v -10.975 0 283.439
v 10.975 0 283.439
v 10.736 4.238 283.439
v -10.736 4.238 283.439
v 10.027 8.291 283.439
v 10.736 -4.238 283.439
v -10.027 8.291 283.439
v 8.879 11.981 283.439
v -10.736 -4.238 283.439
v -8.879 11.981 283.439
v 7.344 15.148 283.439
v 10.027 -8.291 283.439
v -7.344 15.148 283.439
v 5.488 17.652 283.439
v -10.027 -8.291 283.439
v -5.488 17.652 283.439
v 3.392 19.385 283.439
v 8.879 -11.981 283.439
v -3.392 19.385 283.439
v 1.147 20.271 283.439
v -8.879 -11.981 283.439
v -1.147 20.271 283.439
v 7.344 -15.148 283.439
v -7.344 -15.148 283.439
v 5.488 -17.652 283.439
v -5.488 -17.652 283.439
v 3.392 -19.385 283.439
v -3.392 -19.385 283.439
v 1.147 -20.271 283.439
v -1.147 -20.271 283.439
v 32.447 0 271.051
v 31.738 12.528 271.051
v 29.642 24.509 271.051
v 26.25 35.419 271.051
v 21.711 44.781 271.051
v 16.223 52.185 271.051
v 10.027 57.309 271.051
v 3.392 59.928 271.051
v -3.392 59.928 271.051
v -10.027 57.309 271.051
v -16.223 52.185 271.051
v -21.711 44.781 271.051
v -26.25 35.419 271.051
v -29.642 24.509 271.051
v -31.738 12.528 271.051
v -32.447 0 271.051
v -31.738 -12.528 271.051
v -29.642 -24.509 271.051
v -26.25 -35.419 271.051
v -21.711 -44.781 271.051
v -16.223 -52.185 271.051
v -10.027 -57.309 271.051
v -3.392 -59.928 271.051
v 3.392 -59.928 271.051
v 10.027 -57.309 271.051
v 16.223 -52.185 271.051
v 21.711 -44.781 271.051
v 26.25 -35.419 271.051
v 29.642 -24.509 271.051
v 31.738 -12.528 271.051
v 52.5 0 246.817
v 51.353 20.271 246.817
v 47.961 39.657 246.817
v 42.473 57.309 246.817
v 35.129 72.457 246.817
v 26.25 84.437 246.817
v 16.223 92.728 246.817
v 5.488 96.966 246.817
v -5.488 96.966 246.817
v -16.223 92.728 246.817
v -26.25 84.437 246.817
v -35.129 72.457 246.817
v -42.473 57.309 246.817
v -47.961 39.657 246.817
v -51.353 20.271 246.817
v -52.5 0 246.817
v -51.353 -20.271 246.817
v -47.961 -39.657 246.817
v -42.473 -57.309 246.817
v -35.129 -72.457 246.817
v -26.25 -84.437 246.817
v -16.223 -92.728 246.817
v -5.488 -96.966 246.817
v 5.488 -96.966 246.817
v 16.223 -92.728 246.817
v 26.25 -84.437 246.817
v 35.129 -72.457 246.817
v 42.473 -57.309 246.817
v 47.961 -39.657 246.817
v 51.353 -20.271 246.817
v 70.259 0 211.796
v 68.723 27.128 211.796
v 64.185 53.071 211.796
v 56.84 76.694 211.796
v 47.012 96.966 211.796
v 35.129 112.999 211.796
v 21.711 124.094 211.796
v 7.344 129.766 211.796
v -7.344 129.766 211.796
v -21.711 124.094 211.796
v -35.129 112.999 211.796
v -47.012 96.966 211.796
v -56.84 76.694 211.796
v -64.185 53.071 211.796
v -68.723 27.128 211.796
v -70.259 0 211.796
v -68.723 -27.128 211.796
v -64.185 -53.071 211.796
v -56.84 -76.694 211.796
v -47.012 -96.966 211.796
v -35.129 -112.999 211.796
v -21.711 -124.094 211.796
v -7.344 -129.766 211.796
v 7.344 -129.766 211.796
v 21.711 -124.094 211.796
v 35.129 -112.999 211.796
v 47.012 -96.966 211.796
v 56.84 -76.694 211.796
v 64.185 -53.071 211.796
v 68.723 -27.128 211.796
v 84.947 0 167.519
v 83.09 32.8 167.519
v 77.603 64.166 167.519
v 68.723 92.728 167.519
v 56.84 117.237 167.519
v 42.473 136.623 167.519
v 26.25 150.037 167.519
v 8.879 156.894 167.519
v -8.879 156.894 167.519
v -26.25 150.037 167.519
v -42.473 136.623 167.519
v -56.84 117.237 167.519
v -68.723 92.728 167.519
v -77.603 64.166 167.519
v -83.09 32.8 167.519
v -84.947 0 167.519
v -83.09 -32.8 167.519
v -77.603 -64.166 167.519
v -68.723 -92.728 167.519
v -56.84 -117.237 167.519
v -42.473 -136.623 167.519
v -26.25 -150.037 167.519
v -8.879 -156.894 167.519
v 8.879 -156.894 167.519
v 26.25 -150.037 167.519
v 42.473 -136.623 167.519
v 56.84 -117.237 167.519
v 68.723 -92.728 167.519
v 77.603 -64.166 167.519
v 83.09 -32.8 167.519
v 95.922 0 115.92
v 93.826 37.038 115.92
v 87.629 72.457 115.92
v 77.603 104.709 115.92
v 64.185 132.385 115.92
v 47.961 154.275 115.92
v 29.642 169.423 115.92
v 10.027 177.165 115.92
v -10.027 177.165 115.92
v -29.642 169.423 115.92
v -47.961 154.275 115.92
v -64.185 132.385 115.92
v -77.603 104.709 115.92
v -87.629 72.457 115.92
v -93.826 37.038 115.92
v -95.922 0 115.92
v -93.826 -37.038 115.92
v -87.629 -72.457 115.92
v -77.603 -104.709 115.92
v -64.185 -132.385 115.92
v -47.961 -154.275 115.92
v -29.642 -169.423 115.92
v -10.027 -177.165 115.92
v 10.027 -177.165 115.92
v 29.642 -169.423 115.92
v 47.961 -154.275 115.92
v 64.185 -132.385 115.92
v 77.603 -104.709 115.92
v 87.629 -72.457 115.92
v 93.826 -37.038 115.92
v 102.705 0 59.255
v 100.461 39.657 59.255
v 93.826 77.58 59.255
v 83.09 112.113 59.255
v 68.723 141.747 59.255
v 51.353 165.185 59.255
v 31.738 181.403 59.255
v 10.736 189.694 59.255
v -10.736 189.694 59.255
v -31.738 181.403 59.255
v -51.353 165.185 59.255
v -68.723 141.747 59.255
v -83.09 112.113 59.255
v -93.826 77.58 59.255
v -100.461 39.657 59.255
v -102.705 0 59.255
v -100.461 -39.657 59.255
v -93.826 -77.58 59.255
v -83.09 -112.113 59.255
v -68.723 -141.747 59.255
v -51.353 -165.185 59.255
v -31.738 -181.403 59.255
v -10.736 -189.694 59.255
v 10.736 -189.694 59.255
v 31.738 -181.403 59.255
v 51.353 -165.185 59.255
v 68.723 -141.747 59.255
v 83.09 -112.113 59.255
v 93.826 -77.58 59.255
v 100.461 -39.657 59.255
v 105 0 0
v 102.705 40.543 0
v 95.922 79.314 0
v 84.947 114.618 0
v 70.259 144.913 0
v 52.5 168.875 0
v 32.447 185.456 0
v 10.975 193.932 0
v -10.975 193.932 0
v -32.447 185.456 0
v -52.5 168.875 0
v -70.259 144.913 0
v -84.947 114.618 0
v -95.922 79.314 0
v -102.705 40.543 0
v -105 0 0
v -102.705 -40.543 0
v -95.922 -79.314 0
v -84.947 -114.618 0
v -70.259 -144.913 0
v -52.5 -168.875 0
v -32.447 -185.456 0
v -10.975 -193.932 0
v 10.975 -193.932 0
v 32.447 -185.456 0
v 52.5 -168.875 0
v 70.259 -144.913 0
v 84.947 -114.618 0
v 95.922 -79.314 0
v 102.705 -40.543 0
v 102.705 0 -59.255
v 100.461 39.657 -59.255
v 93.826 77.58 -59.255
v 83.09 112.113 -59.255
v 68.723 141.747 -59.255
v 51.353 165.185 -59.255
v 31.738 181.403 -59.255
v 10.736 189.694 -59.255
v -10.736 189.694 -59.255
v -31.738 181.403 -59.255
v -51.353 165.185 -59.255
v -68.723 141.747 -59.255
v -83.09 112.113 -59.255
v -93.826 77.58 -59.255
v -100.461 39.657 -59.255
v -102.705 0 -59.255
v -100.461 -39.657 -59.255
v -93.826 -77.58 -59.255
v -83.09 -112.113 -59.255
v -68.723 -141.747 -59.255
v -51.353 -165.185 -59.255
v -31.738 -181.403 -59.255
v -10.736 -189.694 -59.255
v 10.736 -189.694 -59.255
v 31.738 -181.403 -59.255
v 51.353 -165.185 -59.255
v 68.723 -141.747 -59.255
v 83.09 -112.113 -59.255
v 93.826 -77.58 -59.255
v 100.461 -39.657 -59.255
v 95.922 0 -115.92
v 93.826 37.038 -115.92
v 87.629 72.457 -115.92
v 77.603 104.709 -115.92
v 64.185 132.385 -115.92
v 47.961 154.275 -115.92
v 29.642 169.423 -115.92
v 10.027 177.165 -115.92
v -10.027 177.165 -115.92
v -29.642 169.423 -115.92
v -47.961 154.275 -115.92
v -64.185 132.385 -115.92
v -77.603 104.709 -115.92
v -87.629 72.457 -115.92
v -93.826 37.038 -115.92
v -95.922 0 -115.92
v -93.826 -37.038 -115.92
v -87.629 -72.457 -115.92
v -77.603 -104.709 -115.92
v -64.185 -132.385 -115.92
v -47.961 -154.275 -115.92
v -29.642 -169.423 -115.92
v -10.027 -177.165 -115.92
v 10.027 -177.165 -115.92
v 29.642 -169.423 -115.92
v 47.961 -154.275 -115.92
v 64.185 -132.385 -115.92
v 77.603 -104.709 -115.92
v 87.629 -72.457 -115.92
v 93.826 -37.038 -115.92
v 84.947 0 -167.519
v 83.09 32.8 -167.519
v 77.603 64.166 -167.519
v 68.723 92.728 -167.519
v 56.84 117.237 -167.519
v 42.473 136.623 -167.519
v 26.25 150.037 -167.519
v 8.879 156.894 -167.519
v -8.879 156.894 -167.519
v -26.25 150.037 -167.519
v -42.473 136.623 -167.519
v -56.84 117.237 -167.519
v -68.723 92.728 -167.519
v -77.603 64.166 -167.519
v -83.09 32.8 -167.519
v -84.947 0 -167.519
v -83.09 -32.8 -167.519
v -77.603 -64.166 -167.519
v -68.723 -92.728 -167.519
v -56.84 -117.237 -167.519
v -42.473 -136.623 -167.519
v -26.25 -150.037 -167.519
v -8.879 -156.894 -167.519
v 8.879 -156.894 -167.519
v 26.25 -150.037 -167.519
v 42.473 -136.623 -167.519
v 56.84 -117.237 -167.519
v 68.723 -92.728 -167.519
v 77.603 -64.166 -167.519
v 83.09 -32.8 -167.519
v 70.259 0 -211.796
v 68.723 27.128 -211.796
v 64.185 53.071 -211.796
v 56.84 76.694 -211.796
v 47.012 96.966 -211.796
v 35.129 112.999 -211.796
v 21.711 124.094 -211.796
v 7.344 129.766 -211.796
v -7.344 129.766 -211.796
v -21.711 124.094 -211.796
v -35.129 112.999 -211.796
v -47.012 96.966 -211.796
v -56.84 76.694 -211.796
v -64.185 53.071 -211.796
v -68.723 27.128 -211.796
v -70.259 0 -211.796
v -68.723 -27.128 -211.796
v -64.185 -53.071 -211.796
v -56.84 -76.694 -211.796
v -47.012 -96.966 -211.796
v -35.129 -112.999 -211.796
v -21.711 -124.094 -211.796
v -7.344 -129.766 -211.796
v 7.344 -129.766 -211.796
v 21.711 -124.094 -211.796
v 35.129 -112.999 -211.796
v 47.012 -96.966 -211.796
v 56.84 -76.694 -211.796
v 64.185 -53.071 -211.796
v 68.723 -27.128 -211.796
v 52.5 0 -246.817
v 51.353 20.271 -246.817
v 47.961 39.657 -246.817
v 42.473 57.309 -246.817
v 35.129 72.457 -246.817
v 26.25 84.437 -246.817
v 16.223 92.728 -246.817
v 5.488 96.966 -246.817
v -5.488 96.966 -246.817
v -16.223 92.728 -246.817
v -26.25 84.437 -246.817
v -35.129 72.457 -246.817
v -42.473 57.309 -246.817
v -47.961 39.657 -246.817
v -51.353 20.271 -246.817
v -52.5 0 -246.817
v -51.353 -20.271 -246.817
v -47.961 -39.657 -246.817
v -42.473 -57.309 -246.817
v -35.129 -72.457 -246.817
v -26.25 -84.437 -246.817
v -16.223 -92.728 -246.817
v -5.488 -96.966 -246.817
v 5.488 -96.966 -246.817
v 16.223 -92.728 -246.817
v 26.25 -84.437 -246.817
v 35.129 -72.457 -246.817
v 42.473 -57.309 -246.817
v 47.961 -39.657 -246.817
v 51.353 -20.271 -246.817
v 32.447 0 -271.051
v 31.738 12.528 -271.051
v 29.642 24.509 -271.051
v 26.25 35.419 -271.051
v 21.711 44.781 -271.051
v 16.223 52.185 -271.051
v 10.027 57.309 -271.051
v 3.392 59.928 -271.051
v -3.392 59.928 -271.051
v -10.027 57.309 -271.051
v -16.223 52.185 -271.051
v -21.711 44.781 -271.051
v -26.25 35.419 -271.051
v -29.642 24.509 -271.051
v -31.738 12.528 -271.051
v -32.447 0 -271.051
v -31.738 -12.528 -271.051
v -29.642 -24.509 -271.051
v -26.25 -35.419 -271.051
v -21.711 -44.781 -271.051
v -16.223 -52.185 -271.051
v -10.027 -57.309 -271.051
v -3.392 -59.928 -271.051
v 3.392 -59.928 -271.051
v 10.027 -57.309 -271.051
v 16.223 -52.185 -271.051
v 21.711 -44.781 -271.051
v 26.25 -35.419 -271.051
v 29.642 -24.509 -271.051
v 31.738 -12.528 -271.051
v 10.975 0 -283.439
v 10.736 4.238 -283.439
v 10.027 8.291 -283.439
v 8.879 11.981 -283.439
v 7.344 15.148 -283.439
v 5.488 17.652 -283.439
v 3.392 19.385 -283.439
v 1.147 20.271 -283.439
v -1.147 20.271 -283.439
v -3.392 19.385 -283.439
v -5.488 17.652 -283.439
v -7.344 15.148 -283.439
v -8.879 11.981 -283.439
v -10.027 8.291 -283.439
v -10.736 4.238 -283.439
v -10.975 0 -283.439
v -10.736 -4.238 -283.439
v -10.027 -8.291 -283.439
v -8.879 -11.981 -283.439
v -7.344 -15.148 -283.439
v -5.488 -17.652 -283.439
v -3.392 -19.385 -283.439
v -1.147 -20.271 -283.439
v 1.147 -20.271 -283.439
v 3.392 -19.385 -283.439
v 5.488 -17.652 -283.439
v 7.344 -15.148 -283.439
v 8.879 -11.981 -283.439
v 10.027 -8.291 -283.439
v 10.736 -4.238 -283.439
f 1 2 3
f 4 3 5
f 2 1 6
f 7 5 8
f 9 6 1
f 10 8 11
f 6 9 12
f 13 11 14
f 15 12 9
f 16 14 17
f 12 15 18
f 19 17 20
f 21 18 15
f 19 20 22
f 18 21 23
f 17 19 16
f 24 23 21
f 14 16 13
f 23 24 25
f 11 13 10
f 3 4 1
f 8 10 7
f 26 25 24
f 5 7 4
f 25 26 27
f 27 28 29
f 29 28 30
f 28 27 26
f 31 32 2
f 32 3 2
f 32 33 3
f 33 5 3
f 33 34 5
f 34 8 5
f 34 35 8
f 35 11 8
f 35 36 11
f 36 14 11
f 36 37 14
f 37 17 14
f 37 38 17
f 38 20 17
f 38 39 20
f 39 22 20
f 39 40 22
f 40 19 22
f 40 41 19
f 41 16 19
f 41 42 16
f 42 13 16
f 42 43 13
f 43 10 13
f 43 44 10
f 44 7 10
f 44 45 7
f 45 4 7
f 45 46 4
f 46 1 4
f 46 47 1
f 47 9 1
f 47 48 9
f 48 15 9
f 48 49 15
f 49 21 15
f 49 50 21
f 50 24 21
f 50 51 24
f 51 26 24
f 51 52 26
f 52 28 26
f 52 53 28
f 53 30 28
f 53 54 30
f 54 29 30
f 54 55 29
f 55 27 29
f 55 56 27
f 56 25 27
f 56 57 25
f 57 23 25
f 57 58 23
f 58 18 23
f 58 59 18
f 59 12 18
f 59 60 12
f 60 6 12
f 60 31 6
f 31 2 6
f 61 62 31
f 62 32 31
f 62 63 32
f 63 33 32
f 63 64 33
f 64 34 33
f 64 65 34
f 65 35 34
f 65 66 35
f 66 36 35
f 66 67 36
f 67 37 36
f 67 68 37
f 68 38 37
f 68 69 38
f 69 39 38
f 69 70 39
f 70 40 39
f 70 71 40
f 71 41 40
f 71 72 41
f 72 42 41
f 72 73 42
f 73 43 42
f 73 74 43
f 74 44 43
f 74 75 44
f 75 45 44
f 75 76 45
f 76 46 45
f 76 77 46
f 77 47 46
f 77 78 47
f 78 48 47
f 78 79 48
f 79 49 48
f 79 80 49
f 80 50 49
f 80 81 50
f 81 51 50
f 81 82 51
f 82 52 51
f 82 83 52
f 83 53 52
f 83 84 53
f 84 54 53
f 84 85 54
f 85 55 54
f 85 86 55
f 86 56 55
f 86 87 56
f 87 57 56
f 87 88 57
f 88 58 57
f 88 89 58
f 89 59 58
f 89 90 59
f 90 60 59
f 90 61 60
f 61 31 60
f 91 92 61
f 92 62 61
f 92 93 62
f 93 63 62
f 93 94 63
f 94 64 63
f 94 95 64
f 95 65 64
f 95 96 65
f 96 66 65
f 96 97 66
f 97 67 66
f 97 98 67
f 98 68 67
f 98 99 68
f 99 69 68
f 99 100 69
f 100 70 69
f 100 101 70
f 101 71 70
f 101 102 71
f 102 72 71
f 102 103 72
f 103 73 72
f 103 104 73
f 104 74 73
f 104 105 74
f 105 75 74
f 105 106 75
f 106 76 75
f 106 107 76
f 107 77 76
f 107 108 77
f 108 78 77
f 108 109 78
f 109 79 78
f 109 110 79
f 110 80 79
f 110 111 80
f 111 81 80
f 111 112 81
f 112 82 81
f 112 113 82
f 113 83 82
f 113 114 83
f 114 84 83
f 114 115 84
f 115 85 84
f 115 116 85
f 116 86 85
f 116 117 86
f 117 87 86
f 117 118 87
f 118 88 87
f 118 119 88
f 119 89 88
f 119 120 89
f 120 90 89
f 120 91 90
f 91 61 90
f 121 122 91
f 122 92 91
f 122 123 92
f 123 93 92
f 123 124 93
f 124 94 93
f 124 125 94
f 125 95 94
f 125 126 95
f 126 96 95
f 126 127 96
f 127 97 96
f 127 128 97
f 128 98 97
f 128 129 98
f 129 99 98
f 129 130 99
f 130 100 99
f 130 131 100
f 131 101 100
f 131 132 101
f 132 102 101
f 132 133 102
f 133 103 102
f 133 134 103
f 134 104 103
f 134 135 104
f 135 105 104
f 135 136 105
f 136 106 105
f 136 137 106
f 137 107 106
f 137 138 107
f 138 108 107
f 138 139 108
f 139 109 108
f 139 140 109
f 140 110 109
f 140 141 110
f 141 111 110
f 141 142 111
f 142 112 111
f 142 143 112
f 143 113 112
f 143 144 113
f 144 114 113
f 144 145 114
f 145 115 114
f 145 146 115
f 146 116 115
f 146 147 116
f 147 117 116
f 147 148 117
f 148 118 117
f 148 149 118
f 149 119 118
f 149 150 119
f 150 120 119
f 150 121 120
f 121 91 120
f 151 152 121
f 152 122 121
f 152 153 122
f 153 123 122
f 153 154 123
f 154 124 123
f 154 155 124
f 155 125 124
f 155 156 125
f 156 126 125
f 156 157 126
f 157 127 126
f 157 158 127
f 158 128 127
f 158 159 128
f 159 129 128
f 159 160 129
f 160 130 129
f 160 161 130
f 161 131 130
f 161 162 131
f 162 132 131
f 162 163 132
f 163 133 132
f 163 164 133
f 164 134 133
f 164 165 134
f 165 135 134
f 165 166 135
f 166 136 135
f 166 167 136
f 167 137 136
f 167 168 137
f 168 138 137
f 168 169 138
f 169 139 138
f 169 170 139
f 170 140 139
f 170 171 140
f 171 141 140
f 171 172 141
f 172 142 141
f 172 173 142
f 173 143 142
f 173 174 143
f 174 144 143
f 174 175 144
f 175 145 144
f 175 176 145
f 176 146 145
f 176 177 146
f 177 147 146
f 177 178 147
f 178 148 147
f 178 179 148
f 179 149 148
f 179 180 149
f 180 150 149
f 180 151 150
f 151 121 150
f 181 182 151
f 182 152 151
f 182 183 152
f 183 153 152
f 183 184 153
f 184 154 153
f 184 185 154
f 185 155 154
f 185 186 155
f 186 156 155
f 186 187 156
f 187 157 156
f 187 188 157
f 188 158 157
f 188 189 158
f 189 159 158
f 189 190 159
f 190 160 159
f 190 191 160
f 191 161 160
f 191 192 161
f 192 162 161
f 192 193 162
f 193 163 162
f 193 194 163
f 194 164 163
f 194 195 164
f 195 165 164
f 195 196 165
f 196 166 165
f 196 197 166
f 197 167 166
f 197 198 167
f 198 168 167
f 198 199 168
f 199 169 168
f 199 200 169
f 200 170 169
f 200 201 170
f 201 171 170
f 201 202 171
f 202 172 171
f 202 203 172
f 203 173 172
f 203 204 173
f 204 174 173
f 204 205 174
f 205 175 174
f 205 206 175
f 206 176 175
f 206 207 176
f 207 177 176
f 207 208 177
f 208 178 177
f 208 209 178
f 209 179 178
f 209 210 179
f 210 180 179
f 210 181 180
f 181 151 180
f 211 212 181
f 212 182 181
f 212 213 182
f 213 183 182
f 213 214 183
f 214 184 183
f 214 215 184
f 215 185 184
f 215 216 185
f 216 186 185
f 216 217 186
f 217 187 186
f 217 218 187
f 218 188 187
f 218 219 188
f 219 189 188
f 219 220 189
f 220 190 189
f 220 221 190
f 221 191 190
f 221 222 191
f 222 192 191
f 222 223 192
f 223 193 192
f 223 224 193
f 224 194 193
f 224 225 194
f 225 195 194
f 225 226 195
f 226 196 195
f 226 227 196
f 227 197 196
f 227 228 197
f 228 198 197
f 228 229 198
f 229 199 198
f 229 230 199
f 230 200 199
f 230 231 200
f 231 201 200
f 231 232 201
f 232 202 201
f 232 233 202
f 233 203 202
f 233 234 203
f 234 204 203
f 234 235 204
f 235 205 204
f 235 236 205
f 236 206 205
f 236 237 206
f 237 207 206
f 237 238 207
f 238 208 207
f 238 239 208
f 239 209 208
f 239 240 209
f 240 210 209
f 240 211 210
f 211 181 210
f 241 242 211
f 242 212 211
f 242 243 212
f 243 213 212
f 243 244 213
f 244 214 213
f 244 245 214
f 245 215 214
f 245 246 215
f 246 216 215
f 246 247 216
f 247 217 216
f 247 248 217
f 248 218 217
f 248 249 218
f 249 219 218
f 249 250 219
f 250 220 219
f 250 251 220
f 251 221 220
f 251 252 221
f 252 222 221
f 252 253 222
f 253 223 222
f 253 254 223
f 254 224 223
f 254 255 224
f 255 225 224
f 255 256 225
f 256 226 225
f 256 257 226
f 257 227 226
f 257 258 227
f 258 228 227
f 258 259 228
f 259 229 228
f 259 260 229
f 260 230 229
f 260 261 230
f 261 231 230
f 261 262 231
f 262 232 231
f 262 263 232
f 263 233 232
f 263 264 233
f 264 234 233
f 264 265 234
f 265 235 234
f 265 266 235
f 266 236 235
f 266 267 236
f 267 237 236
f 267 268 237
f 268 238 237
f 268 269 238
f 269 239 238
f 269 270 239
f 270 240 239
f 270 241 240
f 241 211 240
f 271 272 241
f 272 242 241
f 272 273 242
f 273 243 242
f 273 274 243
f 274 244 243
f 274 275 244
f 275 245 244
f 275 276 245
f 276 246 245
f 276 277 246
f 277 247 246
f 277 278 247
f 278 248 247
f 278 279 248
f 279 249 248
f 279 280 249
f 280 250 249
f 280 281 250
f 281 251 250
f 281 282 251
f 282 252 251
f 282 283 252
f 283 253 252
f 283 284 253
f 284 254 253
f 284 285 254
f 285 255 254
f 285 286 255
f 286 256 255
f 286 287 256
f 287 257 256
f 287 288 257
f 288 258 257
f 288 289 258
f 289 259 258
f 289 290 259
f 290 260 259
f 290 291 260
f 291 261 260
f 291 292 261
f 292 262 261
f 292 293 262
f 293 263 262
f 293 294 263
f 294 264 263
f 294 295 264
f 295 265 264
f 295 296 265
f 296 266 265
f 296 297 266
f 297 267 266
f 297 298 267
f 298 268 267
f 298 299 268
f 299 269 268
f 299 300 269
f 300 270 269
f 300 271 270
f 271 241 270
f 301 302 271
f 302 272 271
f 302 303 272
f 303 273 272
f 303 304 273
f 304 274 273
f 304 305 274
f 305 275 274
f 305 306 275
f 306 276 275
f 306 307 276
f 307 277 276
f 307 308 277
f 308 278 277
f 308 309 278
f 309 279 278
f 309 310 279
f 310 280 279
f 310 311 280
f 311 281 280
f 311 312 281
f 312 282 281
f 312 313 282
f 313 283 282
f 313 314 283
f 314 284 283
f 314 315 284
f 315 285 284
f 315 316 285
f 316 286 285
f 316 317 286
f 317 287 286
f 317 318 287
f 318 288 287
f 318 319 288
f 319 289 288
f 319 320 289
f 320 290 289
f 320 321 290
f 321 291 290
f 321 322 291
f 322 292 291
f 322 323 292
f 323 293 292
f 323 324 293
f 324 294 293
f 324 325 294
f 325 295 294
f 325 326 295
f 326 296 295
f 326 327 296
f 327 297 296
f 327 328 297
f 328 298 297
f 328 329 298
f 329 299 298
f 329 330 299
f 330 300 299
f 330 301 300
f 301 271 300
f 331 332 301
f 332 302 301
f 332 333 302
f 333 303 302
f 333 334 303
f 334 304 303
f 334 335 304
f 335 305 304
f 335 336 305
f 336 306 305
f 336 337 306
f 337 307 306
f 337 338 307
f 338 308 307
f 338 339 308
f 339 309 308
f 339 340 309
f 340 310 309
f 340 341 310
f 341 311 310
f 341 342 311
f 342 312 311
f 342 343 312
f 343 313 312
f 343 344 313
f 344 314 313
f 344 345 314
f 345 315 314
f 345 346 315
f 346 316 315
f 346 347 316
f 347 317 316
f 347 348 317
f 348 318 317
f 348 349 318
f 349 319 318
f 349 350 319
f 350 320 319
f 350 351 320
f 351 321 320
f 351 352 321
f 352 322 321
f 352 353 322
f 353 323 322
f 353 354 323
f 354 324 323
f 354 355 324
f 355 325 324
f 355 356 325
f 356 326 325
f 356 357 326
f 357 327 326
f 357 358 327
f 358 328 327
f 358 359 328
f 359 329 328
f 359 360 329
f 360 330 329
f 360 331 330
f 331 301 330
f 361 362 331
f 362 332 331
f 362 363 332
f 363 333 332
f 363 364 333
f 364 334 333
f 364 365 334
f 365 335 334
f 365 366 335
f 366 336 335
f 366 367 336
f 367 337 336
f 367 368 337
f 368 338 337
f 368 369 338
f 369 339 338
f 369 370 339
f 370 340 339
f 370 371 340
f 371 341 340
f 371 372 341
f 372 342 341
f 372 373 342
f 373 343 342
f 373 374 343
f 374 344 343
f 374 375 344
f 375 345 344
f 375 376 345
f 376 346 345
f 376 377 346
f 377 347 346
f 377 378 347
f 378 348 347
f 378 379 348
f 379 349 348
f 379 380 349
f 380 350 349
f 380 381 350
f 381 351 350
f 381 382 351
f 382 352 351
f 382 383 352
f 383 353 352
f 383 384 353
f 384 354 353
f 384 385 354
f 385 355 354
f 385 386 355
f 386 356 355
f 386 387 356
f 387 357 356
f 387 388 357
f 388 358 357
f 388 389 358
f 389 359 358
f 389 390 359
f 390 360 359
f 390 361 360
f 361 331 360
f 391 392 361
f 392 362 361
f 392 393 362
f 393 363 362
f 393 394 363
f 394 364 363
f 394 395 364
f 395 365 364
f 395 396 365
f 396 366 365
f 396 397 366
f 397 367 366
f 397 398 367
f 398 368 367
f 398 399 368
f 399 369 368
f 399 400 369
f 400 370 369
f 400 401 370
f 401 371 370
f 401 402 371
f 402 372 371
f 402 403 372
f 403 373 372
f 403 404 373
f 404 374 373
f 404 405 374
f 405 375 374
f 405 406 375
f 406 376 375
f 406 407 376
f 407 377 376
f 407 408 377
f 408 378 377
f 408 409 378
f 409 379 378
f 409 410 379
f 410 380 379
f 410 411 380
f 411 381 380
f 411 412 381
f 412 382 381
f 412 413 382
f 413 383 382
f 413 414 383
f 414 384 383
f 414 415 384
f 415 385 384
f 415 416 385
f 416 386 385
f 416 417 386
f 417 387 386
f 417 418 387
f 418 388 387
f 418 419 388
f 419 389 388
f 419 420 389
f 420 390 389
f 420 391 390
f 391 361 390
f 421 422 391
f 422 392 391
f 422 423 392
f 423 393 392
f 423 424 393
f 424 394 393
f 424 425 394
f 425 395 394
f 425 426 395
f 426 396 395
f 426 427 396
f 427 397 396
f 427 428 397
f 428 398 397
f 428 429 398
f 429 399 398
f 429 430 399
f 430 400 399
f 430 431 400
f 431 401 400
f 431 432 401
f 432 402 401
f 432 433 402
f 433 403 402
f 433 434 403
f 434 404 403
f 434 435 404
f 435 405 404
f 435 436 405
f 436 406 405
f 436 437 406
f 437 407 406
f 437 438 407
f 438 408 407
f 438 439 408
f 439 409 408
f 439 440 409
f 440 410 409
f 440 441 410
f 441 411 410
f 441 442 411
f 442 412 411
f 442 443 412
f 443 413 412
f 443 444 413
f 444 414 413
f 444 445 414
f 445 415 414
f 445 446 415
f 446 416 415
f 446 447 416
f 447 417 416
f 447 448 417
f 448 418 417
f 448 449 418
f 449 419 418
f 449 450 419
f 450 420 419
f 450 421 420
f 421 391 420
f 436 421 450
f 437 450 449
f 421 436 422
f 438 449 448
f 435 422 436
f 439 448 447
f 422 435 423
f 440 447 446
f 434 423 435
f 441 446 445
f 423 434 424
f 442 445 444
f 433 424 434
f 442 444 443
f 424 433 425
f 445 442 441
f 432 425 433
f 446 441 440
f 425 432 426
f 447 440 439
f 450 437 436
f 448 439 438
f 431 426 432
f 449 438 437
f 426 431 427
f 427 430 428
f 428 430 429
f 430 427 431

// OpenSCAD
// Generated by SolidPython 1.0.1 on 2020-07-29 00:46:47


scale(v = [7, 13, 19]) {
	sphere(r = 15);
}
/***********************************************
*********      SolidPython code:      **********
************************************************
 
# import packages: SolidPython
from solid import *
from solid.utils import *
from itertools import chain, combinations, permutations


class Resize:

    def __init__(self, scad_file):
        self.scad_file = scad_file
        #self.scad_file = import_scad(scad_file)
        # cone/cylinder param:
        self.r1 = 0
        self.r2 = 0
        self.h = 0
        # rectangular prism param:
        self.w = 0
        self.l = 0
        # ellipse param:
        self.r = 0

    # import OpenScad code (file name corresponds to shape)


    # classify shape + parameters
    def assign(self, param1, param2, param3):
        if self.scad_file == 'cone.scad':
            self.r1 = param1
            self.r2 = param2
            self.h = param3
        elif self.scad_file == 'cylinder.scad':
            self.r1 = param1
            self.r2 = param2
            self.h = param3
        elif self.scad_file == 'rectangularPrism.scad':
            self.h = param1
            self.l = param2
            self.w = param3
        else:
            self.r = param1
            self.h = param2

    # resize parameters
    def iterate(self):
        x = range(3, 20, 2)
        i = 1
        if self.scad_file == 'cone.scad':
            tempList = list(permutations(x, 2))
            for temp in tempList:
                param1 = temp[0]
                param2 = temp[1]
                filepath = 'produced_scad_files/' + 'cone' + str(param1) + '_' + str(param2) + '_' + '.scad'
                scad_render_to_file(cylinder(h=param1, r1=param2, r2=0), filepath)

        elif self.scad_file == 'cylinder.scad':
            tempList = list(permutations(x, 3))
            for temp in tempList:
                param1 = temp[0]
                param2 = temp[1]
                filepath = 'produced_scad_files/' + 'cylinder' + str(param1) + '_' + str(param2) + '_' + '.scad'
                scad_render_to_file(cylinder(h=param1, r1=param2, r2=param2), filepath)

        elif self.scad_file == 'rectangularPrism.scad':
            tempList = list(permutations(x, 3))
            for temp in tempList:
                param1 = temp[0]
                param2 = temp[1]
                param3 = temp[2]
                filepath = 'produced_scad_files/' + 'rectangularPrism' + str(param1) + '_' + str(param2) + '_' + str(
                    param3) + '.scad'
                scad_render_to_file(cube(size=(param1, param2, param3)), filepath)

        elif self.scad_file == 'ellipse.scad':
            tempList = list(permutations(x, 4))
            for temp in tempList:
                param1 = temp[0]
                param2 = temp[1]
                param3 = temp[2]
                param4 = temp[3]
                filepath = 'produced_scad_files/' + 'ellipse' + str(param1) + '_' + str(param2) + '_' + str(param3) + '_' + str(param4) + '.scad'
                scad_render_to_file(scale([param1, param2, param3])(sphere(r=param4)), filepath)

    def render_to_scadfile(self):
        scad_render_to_file(scad, 'example.scad') 
 
************************************************/
